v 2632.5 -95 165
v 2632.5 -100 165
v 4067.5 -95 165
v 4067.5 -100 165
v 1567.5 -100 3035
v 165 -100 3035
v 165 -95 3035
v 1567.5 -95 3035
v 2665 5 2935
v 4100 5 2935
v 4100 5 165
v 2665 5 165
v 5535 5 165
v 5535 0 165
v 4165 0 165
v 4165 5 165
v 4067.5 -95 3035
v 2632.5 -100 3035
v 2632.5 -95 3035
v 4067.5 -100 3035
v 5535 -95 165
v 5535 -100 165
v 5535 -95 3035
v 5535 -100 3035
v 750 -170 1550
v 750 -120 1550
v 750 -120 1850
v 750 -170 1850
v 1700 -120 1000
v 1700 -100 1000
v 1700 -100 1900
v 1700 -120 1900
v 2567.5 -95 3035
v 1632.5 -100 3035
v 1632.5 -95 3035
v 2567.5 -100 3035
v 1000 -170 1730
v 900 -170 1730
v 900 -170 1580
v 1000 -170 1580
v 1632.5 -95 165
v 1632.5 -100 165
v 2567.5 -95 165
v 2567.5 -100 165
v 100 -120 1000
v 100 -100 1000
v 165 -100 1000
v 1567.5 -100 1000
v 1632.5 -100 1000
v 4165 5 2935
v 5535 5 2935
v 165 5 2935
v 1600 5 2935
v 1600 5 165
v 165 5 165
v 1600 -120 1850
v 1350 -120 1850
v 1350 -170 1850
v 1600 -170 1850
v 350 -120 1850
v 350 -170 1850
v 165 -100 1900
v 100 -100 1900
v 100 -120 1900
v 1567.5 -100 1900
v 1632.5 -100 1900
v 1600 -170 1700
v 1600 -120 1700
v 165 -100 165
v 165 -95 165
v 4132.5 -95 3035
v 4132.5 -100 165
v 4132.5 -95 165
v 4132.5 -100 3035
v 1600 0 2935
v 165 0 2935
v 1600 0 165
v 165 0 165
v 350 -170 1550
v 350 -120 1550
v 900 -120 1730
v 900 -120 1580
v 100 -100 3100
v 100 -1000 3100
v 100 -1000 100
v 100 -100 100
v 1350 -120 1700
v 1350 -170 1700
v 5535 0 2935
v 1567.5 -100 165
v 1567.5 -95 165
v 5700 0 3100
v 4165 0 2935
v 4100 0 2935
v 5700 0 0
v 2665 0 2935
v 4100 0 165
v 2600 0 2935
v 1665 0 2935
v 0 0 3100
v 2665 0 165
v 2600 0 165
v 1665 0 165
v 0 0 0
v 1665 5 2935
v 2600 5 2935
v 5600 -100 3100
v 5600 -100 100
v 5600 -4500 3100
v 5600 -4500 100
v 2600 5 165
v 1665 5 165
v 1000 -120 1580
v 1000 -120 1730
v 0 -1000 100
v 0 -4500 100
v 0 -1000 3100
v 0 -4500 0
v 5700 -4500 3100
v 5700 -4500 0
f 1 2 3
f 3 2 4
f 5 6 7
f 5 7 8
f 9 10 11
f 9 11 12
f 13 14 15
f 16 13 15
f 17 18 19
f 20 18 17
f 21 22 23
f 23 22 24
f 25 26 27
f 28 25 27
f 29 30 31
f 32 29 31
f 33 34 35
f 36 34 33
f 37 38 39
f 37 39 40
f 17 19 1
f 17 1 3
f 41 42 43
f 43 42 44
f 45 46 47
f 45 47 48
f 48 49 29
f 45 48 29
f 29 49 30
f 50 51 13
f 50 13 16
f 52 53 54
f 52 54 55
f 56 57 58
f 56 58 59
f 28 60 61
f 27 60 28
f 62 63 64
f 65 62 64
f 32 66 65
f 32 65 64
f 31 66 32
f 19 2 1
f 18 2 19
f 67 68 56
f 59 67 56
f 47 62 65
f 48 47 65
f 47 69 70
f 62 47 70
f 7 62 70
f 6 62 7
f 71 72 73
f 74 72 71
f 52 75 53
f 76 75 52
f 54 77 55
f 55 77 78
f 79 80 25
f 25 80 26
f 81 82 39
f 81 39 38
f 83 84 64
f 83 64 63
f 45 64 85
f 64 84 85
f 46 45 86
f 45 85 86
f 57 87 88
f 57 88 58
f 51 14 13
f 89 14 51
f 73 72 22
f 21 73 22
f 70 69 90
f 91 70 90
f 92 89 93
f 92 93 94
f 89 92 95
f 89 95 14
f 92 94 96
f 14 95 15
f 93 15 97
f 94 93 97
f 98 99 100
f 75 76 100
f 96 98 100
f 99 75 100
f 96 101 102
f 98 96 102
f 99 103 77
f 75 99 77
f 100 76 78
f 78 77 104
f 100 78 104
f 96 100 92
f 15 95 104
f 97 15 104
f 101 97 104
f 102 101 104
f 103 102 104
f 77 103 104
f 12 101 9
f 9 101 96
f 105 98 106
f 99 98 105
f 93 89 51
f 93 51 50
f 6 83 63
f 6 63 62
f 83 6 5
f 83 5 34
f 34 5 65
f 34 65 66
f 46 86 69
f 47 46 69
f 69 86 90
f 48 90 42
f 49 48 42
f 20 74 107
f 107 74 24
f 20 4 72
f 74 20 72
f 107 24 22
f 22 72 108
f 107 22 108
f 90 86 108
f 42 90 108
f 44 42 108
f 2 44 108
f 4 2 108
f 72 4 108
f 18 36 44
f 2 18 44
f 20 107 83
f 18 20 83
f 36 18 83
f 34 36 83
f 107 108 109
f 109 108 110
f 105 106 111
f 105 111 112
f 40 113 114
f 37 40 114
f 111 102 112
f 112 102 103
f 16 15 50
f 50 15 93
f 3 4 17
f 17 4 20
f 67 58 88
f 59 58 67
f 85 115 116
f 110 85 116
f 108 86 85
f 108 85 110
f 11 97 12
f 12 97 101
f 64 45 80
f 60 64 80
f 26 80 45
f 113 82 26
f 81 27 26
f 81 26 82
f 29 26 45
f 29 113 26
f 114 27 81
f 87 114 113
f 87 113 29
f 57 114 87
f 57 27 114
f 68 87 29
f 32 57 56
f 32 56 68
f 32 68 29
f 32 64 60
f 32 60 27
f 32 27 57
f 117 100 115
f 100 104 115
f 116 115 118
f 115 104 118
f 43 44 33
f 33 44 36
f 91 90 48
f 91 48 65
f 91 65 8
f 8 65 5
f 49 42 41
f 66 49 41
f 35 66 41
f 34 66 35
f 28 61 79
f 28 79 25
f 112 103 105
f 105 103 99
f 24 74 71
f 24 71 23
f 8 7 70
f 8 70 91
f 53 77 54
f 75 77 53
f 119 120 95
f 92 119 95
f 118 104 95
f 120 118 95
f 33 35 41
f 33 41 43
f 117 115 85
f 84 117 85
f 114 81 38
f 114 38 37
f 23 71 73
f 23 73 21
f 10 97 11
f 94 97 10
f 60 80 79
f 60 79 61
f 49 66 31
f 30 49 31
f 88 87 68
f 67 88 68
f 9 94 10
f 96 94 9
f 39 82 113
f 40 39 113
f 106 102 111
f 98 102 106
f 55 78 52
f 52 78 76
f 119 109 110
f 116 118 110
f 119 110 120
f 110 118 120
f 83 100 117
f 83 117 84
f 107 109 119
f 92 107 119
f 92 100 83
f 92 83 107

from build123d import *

# Parameters (mm, degrees)
F0_W      = 5700
F0_H      = 4500
F1_DEPTH  = 100
F3_DEPTH  = 3000
F4_W      = 1402.5
F4_H      = 2870
F4_W_2    = 935
F4_W_3    = 1435
F5_DEPTH  = 5
F6_W      = 1600
F6_H      = 900
F7_DEPTH  = 20
F8_W      = 400
F8_H      = 300
F8_W_2    = 100
F8_H_2    = 150
F8_W_3    = 250
F9_DEPTH  = 50
F10_W     = 1370
F10_H     = 2770
F10_W_2   = 1435
F10_W_3   = 935
F11_DEPTH = 5


with BuildPart() as f1:
    # F0 (on Top) → F1 (new body)
    with BuildSketch(Plane.XY):
        with Locations((2850, -2250)):
            Rectangle(F0_W, F0_H)
    extrude(amount=F1_DEPTH)

    # F2 (on face) → F3 (join)
    with BuildSketch(Plane.XY.offset(100)):
        Polygon((5700, 0), (0, 0), (0, -1000), (100, -1000), (100, -100), (5600, -100), (5600, -4500), (5700, -4500), align=None)
    extrude(amount=F3_DEPTH)

    # F4 (on face) → F5 (cut)
    with BuildSketch(Plane.XZ.offset(100)):
        with Locations((866.25, 1600)):
            Rectangle(F4_W, F4_H)
        with Locations((2100, 1600)):
            Rectangle(F4_W_2, F4_H)
        with Locations((3350, 1600)):
            Rectangle(F4_W_3, F4_H)
        with Locations((4833.75, 1600)):
            Rectangle(F4_W, F4_H)
    extrude(amount=-F5_DEPTH, mode=Mode.SUBTRACT)

    # F6 (on face) → F7 (join)
    with BuildSketch(Plane.XZ.offset(100)):
        with Locations((900, 1450)):
            Rectangle(F6_W, F6_H)
    extrude(amount=F7_DEPTH)

    # F8 (on face) → F9 (join)
    with BuildSketch(Plane.XZ.offset(120)):
        with Locations((550, 1700)):
            Rectangle(F8_W, F8_H)
        with Locations((950, 1655)):
            Rectangle(F8_W_2, F8_H_2)
        with Locations((1475, 1775)):
            Rectangle(F8_W_3, F8_H_2)
    extrude(amount=F9_DEPTH)

    # F10 (on face) → F11 (join)
    with BuildSketch(Plane(origin=(0, 0, 0), x_dir=(-1, 0, 0), z_dir=(0, 1, 0))):
        with Locations((-4850, 1550)):
            Rectangle(F10_W, F10_H)
        with Locations((-3382.5, 1550)):
            Rectangle(F10_W_2, F10_H)
        with Locations((-2132.5, 1550)):
            Rectangle(F10_W_3, F10_H)
        with Locations((-882.5, 1550)):
            Rectangle(F10_W_2, F10_H)
    extrude(amount=F11_DEPTH)


solid = f1.part
